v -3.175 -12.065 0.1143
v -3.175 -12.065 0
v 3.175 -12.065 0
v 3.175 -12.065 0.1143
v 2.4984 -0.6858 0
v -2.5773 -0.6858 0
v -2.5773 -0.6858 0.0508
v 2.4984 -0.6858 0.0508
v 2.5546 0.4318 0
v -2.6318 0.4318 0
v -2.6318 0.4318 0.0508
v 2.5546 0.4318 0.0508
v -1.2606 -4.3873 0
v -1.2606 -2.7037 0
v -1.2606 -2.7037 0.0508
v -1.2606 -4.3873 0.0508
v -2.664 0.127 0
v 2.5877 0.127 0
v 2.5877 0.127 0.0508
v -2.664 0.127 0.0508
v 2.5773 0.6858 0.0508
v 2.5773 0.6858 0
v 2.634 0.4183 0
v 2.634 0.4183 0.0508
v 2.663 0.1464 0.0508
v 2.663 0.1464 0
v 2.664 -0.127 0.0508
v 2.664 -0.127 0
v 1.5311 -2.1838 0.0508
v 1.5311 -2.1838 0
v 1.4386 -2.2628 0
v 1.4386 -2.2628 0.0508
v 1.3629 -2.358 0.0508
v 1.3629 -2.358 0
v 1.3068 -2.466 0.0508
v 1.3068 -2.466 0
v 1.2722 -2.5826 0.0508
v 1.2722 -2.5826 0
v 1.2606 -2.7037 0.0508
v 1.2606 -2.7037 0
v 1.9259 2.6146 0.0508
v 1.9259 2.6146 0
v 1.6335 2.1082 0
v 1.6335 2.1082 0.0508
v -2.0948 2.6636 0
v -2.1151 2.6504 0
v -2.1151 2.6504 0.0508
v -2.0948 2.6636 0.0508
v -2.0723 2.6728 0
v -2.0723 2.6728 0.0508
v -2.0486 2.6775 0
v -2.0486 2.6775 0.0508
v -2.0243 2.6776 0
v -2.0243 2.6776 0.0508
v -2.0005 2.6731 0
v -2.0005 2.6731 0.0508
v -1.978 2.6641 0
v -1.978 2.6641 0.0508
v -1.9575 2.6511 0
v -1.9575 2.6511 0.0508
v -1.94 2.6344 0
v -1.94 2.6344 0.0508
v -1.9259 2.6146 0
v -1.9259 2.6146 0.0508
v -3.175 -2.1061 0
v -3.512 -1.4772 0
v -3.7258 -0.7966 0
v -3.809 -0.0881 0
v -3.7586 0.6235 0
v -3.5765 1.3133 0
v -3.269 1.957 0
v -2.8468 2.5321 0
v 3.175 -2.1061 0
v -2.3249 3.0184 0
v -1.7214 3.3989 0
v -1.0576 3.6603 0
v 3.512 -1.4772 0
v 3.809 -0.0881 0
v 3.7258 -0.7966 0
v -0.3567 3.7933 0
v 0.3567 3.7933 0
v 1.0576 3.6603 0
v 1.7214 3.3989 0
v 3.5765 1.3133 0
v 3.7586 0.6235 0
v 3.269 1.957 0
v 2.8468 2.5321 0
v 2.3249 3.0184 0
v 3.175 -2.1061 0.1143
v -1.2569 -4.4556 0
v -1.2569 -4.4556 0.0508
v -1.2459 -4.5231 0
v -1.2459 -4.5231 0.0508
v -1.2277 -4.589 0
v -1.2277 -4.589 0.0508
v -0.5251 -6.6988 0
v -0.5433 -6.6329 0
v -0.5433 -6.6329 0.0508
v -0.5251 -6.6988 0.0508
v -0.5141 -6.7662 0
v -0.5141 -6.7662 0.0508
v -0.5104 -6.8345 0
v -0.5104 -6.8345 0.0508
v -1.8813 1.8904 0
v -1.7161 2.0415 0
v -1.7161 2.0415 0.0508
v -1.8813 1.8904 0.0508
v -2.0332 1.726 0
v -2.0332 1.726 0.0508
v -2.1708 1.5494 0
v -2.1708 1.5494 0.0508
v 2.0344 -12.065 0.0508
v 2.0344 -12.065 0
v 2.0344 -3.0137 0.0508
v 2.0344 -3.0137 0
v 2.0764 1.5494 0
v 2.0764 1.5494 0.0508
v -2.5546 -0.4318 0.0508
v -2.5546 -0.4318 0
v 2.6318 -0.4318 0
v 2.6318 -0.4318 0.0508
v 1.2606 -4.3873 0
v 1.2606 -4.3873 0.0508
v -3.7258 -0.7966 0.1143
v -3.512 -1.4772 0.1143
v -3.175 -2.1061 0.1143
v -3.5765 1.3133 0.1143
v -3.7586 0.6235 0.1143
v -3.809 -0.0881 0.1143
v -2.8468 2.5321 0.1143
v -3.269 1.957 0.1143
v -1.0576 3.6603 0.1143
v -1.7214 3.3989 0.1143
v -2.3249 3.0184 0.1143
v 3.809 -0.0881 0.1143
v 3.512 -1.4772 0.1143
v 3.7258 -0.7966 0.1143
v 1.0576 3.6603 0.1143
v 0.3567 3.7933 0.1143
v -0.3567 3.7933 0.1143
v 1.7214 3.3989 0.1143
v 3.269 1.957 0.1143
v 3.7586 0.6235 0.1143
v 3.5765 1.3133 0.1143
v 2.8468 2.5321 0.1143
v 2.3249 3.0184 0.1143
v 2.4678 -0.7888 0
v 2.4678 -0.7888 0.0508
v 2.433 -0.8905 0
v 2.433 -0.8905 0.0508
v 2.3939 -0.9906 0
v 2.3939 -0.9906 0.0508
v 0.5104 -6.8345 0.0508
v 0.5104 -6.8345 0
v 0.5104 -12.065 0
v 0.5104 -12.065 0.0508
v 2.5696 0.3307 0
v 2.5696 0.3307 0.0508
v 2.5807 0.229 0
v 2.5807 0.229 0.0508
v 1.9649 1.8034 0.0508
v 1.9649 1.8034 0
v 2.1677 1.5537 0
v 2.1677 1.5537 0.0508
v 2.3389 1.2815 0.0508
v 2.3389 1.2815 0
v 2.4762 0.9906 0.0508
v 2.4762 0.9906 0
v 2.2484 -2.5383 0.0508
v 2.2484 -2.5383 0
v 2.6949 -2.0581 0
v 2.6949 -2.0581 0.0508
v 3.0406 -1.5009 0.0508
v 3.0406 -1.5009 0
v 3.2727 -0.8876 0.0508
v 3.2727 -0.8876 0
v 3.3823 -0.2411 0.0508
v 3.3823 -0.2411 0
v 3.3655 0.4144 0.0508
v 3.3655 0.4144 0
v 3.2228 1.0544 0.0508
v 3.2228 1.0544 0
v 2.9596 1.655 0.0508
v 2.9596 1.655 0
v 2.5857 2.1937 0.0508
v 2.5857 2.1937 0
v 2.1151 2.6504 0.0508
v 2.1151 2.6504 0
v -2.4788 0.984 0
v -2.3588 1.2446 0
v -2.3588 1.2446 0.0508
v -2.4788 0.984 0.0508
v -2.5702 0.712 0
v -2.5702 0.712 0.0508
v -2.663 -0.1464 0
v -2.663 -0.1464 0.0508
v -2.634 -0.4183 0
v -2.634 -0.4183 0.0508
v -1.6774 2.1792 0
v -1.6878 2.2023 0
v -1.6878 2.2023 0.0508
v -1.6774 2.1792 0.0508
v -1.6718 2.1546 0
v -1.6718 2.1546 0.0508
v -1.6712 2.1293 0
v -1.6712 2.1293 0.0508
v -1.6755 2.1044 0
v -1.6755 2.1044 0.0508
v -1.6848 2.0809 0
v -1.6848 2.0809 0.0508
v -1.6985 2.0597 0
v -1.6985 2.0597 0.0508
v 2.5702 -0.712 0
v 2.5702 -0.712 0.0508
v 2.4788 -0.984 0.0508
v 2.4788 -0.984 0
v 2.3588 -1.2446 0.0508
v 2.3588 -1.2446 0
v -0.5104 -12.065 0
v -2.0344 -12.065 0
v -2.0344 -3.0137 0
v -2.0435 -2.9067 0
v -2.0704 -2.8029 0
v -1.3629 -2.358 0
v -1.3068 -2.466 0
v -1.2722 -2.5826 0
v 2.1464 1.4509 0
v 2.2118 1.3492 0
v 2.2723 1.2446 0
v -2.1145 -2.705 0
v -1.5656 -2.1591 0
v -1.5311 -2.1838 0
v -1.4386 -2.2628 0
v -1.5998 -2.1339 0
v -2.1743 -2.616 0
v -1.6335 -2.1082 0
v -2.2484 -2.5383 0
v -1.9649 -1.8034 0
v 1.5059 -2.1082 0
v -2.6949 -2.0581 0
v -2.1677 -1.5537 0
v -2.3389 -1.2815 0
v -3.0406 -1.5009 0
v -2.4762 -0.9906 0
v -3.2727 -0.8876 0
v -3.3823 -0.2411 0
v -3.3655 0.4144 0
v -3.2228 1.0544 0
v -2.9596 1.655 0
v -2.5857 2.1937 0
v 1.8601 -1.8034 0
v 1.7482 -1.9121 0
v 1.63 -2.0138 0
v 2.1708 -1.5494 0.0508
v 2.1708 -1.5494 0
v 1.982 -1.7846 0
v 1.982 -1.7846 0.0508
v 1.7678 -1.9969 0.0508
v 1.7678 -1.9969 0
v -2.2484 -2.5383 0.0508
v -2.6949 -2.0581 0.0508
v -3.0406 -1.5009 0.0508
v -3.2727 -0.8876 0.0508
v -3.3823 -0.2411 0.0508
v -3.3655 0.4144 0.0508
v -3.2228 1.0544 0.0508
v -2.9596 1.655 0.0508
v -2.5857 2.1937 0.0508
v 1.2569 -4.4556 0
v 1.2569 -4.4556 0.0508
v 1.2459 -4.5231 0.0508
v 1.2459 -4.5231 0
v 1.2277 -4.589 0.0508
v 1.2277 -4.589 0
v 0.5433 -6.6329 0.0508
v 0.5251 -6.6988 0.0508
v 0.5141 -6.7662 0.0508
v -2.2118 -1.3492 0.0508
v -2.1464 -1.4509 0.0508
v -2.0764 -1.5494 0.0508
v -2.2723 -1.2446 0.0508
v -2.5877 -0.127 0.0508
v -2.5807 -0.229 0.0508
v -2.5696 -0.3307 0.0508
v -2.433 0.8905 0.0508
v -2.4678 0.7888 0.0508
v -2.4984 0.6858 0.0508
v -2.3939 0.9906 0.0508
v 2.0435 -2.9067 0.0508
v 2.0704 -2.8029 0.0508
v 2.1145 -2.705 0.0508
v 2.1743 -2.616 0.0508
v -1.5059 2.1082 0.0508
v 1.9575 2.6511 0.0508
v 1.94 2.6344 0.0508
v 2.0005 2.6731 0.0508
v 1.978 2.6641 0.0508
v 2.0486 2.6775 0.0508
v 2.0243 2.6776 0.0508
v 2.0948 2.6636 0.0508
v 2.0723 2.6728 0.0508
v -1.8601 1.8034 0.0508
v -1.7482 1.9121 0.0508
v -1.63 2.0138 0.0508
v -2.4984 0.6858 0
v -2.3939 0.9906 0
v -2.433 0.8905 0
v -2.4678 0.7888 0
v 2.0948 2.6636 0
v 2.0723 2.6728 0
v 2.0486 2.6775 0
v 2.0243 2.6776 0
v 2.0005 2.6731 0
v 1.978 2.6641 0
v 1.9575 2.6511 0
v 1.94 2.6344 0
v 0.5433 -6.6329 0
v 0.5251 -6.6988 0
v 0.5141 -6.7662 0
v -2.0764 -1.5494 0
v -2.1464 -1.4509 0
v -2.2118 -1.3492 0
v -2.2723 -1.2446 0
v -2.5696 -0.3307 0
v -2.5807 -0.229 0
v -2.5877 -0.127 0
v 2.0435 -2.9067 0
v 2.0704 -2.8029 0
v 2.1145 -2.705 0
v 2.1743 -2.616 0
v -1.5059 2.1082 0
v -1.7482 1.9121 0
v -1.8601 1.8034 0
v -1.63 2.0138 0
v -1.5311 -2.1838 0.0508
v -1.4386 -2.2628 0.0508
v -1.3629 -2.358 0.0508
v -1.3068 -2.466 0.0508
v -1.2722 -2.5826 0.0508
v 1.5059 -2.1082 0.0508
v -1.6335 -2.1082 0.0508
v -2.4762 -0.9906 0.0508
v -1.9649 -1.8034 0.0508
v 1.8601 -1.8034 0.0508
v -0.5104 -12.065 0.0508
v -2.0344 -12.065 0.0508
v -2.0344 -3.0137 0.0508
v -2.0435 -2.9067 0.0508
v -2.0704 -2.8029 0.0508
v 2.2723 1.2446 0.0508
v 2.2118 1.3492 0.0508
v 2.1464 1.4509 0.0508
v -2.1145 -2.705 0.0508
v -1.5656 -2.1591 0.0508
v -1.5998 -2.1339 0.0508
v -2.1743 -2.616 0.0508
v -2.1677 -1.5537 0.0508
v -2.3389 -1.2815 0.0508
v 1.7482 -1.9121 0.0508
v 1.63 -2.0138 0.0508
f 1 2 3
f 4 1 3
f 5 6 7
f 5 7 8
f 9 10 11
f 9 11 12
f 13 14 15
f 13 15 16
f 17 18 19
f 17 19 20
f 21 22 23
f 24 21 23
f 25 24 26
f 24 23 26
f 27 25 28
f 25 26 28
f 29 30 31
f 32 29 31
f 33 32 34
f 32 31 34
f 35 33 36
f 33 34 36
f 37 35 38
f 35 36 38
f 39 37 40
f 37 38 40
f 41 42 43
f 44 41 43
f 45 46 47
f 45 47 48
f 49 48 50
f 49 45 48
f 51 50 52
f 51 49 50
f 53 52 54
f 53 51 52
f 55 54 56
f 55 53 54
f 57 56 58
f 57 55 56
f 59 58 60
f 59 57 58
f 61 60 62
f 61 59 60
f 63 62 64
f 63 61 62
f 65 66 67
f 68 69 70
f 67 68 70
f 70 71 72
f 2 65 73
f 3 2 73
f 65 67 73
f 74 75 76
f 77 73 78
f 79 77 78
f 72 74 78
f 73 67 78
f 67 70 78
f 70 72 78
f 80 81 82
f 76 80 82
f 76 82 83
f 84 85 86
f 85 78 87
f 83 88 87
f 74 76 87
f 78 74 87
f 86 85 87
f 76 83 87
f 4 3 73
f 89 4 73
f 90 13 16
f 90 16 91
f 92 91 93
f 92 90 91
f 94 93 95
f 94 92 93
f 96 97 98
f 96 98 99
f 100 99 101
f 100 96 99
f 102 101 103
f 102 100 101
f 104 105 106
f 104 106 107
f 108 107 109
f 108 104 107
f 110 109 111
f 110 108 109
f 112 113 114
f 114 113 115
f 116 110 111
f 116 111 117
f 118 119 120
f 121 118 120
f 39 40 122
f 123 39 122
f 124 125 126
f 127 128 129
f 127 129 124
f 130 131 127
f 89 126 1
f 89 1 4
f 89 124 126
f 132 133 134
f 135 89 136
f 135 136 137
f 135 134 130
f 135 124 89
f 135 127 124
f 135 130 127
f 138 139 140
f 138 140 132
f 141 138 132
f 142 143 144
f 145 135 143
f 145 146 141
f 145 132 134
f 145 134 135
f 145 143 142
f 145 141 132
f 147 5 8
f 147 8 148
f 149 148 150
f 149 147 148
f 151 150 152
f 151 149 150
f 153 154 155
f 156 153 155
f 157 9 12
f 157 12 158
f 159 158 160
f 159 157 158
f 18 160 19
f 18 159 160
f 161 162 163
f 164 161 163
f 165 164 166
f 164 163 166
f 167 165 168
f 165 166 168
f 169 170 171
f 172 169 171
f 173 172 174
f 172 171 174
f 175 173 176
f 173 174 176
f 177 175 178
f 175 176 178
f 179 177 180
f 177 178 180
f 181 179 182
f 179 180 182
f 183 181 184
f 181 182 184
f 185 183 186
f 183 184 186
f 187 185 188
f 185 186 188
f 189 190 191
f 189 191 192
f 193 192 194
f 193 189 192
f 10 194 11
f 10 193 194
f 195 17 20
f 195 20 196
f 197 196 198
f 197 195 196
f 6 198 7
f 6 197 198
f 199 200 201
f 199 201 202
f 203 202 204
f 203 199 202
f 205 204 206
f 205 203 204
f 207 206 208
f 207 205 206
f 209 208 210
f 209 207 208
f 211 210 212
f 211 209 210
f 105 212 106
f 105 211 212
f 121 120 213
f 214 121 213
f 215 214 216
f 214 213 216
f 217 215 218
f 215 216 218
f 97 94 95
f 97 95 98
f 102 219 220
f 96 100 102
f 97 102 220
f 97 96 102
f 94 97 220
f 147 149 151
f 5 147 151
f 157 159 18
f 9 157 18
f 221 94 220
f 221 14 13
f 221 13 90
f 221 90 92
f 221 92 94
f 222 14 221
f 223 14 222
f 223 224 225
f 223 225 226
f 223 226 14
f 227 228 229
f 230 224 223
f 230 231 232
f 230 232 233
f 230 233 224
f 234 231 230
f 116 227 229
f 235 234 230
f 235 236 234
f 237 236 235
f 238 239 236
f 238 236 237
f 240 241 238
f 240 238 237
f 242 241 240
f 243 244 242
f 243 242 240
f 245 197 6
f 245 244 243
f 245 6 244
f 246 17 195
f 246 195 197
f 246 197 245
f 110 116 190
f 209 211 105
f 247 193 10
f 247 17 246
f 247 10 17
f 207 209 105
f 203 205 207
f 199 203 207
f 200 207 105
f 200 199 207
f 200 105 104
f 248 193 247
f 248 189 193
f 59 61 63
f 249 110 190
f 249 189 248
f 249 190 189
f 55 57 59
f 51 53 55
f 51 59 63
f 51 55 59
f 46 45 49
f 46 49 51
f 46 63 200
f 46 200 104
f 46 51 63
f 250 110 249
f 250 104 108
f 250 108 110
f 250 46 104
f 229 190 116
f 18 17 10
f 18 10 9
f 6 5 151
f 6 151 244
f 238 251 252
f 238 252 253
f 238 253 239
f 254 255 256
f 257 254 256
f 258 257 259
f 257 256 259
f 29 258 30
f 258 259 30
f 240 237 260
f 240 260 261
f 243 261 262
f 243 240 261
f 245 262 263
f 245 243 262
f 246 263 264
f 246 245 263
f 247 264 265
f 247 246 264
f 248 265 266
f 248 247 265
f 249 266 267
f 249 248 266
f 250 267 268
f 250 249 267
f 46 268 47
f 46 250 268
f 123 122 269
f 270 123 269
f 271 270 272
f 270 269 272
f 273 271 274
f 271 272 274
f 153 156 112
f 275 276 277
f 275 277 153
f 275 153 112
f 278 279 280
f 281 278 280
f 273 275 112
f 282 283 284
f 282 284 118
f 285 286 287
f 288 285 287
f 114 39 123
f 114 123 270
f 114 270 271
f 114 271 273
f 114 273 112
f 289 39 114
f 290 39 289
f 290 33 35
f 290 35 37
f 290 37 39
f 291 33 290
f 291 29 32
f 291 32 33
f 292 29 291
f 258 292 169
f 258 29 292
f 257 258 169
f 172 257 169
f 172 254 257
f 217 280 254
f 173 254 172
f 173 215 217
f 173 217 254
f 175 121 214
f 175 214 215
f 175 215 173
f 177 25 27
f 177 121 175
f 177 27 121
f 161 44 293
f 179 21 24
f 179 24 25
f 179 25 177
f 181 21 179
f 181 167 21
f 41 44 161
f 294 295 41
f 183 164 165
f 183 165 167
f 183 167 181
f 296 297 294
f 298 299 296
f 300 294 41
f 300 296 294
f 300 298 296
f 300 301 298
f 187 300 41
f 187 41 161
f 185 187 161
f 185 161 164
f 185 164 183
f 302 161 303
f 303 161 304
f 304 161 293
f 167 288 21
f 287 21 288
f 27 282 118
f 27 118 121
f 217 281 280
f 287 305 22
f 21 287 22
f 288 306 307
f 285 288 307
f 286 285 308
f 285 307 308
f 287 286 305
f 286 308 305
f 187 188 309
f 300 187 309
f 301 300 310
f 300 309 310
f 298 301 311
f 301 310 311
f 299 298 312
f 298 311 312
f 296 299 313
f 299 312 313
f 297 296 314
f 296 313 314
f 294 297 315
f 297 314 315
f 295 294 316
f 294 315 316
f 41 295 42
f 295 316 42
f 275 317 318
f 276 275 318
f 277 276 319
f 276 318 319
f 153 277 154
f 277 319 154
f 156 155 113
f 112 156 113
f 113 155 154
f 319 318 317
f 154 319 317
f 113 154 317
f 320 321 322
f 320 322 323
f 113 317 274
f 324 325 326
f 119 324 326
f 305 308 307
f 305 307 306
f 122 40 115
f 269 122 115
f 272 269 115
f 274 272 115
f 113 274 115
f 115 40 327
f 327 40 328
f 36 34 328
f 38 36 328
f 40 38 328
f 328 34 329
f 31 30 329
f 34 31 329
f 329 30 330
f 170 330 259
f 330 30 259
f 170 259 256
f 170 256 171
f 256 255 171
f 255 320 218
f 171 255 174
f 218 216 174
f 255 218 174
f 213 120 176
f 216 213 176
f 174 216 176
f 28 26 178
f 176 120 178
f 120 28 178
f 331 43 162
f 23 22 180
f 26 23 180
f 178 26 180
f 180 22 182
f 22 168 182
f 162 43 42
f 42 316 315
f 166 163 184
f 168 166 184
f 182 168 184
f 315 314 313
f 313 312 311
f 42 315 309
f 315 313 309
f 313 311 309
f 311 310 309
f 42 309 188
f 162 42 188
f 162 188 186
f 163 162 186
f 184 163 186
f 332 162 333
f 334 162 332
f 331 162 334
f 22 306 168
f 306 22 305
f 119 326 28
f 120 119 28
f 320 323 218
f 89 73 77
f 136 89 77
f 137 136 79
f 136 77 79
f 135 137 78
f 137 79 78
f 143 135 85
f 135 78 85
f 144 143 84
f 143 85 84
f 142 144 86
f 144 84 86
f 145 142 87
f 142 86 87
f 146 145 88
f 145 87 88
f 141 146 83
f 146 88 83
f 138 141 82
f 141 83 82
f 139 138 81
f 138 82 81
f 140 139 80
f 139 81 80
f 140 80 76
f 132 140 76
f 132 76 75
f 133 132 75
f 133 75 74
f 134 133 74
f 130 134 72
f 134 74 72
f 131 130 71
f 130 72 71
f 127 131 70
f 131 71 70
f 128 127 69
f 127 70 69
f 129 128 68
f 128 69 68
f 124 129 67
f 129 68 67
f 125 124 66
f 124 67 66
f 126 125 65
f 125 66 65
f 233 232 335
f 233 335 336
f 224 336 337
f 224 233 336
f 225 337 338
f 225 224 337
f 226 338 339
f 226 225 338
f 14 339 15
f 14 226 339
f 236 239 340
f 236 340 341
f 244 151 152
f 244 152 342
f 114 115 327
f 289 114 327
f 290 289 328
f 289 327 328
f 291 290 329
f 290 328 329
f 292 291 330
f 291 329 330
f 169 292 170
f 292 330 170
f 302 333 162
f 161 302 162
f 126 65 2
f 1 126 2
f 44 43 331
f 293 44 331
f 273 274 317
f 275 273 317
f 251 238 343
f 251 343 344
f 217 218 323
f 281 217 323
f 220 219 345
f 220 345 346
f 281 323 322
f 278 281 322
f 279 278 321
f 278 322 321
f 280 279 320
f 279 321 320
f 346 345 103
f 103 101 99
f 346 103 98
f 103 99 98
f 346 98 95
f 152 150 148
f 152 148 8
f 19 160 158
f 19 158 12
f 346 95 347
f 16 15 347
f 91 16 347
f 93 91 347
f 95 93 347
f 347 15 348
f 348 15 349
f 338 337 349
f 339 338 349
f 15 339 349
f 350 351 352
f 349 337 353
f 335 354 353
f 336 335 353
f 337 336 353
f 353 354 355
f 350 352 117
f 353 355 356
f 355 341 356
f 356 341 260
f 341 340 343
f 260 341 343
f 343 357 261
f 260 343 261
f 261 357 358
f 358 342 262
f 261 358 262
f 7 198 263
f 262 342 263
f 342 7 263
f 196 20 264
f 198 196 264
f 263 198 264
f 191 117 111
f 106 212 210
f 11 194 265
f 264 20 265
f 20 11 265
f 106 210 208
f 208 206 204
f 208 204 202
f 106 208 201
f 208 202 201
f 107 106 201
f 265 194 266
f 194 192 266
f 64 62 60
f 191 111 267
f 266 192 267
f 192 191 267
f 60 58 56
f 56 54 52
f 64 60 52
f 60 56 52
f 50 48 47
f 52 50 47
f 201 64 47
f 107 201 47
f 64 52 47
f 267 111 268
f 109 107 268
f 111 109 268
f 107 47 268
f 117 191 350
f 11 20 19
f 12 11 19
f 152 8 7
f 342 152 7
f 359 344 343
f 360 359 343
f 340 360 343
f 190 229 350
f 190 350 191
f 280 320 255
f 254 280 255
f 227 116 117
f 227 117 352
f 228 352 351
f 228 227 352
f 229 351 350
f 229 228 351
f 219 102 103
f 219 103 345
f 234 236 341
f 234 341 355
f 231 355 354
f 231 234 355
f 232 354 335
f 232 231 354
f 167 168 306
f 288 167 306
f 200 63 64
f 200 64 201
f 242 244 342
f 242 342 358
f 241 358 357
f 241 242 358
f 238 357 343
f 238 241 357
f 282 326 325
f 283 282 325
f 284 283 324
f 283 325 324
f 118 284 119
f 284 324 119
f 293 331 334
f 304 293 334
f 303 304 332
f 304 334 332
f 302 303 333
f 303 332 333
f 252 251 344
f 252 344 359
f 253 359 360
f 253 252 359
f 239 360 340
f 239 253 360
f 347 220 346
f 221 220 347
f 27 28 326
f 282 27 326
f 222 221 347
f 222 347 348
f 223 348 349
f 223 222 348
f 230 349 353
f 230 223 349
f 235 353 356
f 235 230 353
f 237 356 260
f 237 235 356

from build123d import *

# Parameters (mm, degrees)
BOSS_EXTRUDE1_DEPTH   = 0.1143
BOSS_EXTRUDE3_DEPTH   = 0.0508
BOSS_EXTRUDE3_2_DEPTH = 0.0508


with BuildPart() as part:
    # Sketch1 → Boss-Extrude1 (new body)
    with BuildSketch(Plane.XY):
        with BuildLine():
            Line((-3.175, -2.106056742), (-3.175, -12.065))
            Line((-3.175, -12.065), (3.175, -12.065))
            Line((3.175, -12.065), (3.175, -2.106056742))
            ThreePointArc((3.175, -2.106056742), (0, 3.81), (-3.175, -2.106056742))
        make_face()
    extrude(amount=BOSS_EXTRUDE1_DEPTH)


with BuildPart() as body_2:
    # Sketch2 → Boss-Extrude3 (new body)
    with BuildSketch(Plane(origin=(0, 0, 0), x_dir=(-1, 0, 0), z_dir=(0, 0, -1))):
        with BuildLine():
            Line((-2.034412002, -12.065), (-2.034412002, -3.013653991))
            ThreePointArc((-2.034412002, -3.013653991), (-2.090366562, -2.753017504), (-2.248369099, -2.538314245))
            ThreePointArc((-2.248369099, -2.538314245), (-3.38978212, 0.087063113), (-2.115102611, 2.650385586))
            ThreePointArc((-2.115102611, 2.650385586), (-2.012295955, 2.675910206), (-1.925900059, 2.614620208))
            Line((-1.925900059, 2.614620208), (-1.633518215, 2.1082))
            Line((-1.633518215, 2.1082), (1.50590086, 2.1082))
            ThreePointArc((1.50590086, 2.1082), (1.689889268, 1.963802154), (1.860105664, 1.8034))
            Line((1.860105664, 1.8034), (-1.964850488, 1.8034))
            ThreePointArc((-1.964850488, 1.8034), (-2.257411937, 1.420204333), (-2.476206906, 0.9906))
            Line((-2.476206906, 0.9906), (2.393941578, 0.9906))
            ThreePointArc((2.393941578, 0.9906), (2.450905617, 0.83982516), (2.498384078, 0.6858))
            Line((2.498384078, 0.6858), (-2.577317862, 0.6858))
            ThreePointArc((-2.577317862, 0.6858), (-2.651970456, 0.282739637), (-2.663974474, -0.127))
            Line((-2.663974474, -0.127), (2.587685383, -0.127))
            ThreePointArc((2.587685383, -0.127), (2.575637011, -0.279890387), (2.55456325, -0.4318))
            Line((2.55456325, -0.4318), (-2.631812638, -0.4318))
            ThreePointArc((-2.631812638, -0.4318), (-2.528175931, -0.849244052), (-2.358783551, -1.2446))
            Line((-2.358783551, -1.2446), (2.272270996, -1.2446))
            ThreePointArc((2.272270996, -1.2446), (2.179689938, -1.400427226), (2.07644029, -1.5494))
            Line((2.07644029, -1.5494), (-2.170771439, -1.5494))
            ThreePointArc((-2.170771439, -1.5494), (-1.877890411, -1.893783674), (-1.531050697, -2.183751992))
            ThreePointArc((-1.531050697, -2.183751992), (-1.332245968, -2.410653085), (-1.260586578, -2.703692942))
            Line((-1.260586578, -2.703692942), (-1.260586578, -3.147876155))
            Line((-1.260586578, -3.147876155), (-1.260586578, -4.387318627))
            ThreePointArc((-1.260586578, -4.387318627), (-1.252316574, -4.489468083), (-1.227721975, -4.588956826))
            Line((-1.227721975, -4.588956826), (-0.543276604, -6.632859168))
            ThreePointArc((-0.543276604, -6.632859168), (-0.518682005, -6.732347911), (-0.510412002, -6.834497367))
            Line((-0.510412002, -6.834497367), (-0.510412002, -12.065))
            Line((-0.510412002, -12.065), (-2.034412002, -12.065))
        make_face()
    extrude(amount=-BOSS_EXTRUDE3_DEPTH)


with BuildPart() as body_3:
    # Sketch2 → Boss-Extrude3 2 (new body)
    with BuildSketch(Plane(origin=(0, 0, 0), x_dir=(-1, 0, 0), z_dir=(0, 0, -1))):
        with BuildLine():
            Line((0.510412002, -12.065), (2.034412002, -12.065))
            Line((2.034412002, -12.065), (2.034412002, -3.013653991))
            ThreePointArc((2.034412002, -3.013653991), (2.090366562, -2.753017504), (2.248369099, -2.538314245))
            ThreePointArc((2.248369099, -2.538314245), (3.38978212, 0.087063113), (2.115102611, 2.650385586))
            ThreePointArc((2.115102611, 2.650385586), (2.012295955, 2.675910206), (1.925900059, 2.614620208))
            Line((1.925900059, 2.614620208), (1.687826002, 2.202263846))
            ThreePointArc((1.687826002, 2.202263846), (1.672731056, 2.116764971), (1.716092536, 2.041547307))
            ThreePointArc((1.716092536, 2.041547307), (1.958948732, 1.809809069), (2.170771439, 1.5494))
            Line((2.170771439, 1.5494), (-2.07644029, 1.5494))
            ThreePointArc((-2.07644029, 1.5494), (-2.179689938, 1.400427226), (-2.272270996, 1.2446))
            Line((-2.272270996, 1.2446), (2.358783551, 1.2446))
            ThreePointArc((2.358783551, 1.2446), (2.528175931, 0.849244052), (2.631812638, 0.4318))
            Line((2.631812638, 0.4318), (-2.55456325, 0.4318))
            ThreePointArc((-2.55456325, 0.4318), (-2.575637011, 0.279890387), (-2.587685383, 0.127))
            Line((-2.587685383, 0.127), (2.663974474, 0.127))
            ThreePointArc((2.663974474, 0.127), (2.651970456, -0.282739637), (2.577317862, -0.6858))
            Line((2.577317862, -0.6858), (-2.498384078, -0.6858))
            ThreePointArc((-2.498384078, -0.6858), (-2.450905617, -0.83982516), (-2.393941578, -0.9906))
            Line((-2.393941578, -0.9906), (2.476206906, -0.9906))
            ThreePointArc((2.476206906, -0.9906), (2.257411937, -1.420204333), (1.964850488, -1.8034))
            Line((1.964850488, -1.8034), (-1.860105664, -1.8034))
            ThreePointArc((-1.860105664, -1.8034), (-1.689889268, -1.963802154), (-1.50590086, -2.1082))
            Line((-1.50590086, -2.1082), (1.633518215, -2.1082))
            ThreePointArc((1.633518215, -2.1082), (1.582735331, -2.146587495), (1.531050697, -2.183751992))
            ThreePointArc((1.531050697, -2.183751992), (1.332245968, -2.410653085), (1.260586578, -2.703692942))
            Line((1.260586578, -2.703692942), (1.260586578, -3.147876155))
            Line((1.260586578, -3.147876155), (1.260586578, -4.387318627))
            ThreePointArc((1.260586578, -4.387318627), (1.252316574, -4.489468083), (1.227721975, -4.588956826))
            Line((1.227721975, -4.588956826), (0.543276604, -6.632859168))
            ThreePointArc((0.543276604, -6.632859168), (0.518682005, -6.732347911), (0.510412002, -6.834497367))
            Line((0.510412002, -6.834497367), (0.510412002, -12.065))
        make_face()
    extrude(amount=-BOSS_EXTRUDE3_2_DEPTH)


solid = Compound([part.part, body_2.part, body_3.part])
